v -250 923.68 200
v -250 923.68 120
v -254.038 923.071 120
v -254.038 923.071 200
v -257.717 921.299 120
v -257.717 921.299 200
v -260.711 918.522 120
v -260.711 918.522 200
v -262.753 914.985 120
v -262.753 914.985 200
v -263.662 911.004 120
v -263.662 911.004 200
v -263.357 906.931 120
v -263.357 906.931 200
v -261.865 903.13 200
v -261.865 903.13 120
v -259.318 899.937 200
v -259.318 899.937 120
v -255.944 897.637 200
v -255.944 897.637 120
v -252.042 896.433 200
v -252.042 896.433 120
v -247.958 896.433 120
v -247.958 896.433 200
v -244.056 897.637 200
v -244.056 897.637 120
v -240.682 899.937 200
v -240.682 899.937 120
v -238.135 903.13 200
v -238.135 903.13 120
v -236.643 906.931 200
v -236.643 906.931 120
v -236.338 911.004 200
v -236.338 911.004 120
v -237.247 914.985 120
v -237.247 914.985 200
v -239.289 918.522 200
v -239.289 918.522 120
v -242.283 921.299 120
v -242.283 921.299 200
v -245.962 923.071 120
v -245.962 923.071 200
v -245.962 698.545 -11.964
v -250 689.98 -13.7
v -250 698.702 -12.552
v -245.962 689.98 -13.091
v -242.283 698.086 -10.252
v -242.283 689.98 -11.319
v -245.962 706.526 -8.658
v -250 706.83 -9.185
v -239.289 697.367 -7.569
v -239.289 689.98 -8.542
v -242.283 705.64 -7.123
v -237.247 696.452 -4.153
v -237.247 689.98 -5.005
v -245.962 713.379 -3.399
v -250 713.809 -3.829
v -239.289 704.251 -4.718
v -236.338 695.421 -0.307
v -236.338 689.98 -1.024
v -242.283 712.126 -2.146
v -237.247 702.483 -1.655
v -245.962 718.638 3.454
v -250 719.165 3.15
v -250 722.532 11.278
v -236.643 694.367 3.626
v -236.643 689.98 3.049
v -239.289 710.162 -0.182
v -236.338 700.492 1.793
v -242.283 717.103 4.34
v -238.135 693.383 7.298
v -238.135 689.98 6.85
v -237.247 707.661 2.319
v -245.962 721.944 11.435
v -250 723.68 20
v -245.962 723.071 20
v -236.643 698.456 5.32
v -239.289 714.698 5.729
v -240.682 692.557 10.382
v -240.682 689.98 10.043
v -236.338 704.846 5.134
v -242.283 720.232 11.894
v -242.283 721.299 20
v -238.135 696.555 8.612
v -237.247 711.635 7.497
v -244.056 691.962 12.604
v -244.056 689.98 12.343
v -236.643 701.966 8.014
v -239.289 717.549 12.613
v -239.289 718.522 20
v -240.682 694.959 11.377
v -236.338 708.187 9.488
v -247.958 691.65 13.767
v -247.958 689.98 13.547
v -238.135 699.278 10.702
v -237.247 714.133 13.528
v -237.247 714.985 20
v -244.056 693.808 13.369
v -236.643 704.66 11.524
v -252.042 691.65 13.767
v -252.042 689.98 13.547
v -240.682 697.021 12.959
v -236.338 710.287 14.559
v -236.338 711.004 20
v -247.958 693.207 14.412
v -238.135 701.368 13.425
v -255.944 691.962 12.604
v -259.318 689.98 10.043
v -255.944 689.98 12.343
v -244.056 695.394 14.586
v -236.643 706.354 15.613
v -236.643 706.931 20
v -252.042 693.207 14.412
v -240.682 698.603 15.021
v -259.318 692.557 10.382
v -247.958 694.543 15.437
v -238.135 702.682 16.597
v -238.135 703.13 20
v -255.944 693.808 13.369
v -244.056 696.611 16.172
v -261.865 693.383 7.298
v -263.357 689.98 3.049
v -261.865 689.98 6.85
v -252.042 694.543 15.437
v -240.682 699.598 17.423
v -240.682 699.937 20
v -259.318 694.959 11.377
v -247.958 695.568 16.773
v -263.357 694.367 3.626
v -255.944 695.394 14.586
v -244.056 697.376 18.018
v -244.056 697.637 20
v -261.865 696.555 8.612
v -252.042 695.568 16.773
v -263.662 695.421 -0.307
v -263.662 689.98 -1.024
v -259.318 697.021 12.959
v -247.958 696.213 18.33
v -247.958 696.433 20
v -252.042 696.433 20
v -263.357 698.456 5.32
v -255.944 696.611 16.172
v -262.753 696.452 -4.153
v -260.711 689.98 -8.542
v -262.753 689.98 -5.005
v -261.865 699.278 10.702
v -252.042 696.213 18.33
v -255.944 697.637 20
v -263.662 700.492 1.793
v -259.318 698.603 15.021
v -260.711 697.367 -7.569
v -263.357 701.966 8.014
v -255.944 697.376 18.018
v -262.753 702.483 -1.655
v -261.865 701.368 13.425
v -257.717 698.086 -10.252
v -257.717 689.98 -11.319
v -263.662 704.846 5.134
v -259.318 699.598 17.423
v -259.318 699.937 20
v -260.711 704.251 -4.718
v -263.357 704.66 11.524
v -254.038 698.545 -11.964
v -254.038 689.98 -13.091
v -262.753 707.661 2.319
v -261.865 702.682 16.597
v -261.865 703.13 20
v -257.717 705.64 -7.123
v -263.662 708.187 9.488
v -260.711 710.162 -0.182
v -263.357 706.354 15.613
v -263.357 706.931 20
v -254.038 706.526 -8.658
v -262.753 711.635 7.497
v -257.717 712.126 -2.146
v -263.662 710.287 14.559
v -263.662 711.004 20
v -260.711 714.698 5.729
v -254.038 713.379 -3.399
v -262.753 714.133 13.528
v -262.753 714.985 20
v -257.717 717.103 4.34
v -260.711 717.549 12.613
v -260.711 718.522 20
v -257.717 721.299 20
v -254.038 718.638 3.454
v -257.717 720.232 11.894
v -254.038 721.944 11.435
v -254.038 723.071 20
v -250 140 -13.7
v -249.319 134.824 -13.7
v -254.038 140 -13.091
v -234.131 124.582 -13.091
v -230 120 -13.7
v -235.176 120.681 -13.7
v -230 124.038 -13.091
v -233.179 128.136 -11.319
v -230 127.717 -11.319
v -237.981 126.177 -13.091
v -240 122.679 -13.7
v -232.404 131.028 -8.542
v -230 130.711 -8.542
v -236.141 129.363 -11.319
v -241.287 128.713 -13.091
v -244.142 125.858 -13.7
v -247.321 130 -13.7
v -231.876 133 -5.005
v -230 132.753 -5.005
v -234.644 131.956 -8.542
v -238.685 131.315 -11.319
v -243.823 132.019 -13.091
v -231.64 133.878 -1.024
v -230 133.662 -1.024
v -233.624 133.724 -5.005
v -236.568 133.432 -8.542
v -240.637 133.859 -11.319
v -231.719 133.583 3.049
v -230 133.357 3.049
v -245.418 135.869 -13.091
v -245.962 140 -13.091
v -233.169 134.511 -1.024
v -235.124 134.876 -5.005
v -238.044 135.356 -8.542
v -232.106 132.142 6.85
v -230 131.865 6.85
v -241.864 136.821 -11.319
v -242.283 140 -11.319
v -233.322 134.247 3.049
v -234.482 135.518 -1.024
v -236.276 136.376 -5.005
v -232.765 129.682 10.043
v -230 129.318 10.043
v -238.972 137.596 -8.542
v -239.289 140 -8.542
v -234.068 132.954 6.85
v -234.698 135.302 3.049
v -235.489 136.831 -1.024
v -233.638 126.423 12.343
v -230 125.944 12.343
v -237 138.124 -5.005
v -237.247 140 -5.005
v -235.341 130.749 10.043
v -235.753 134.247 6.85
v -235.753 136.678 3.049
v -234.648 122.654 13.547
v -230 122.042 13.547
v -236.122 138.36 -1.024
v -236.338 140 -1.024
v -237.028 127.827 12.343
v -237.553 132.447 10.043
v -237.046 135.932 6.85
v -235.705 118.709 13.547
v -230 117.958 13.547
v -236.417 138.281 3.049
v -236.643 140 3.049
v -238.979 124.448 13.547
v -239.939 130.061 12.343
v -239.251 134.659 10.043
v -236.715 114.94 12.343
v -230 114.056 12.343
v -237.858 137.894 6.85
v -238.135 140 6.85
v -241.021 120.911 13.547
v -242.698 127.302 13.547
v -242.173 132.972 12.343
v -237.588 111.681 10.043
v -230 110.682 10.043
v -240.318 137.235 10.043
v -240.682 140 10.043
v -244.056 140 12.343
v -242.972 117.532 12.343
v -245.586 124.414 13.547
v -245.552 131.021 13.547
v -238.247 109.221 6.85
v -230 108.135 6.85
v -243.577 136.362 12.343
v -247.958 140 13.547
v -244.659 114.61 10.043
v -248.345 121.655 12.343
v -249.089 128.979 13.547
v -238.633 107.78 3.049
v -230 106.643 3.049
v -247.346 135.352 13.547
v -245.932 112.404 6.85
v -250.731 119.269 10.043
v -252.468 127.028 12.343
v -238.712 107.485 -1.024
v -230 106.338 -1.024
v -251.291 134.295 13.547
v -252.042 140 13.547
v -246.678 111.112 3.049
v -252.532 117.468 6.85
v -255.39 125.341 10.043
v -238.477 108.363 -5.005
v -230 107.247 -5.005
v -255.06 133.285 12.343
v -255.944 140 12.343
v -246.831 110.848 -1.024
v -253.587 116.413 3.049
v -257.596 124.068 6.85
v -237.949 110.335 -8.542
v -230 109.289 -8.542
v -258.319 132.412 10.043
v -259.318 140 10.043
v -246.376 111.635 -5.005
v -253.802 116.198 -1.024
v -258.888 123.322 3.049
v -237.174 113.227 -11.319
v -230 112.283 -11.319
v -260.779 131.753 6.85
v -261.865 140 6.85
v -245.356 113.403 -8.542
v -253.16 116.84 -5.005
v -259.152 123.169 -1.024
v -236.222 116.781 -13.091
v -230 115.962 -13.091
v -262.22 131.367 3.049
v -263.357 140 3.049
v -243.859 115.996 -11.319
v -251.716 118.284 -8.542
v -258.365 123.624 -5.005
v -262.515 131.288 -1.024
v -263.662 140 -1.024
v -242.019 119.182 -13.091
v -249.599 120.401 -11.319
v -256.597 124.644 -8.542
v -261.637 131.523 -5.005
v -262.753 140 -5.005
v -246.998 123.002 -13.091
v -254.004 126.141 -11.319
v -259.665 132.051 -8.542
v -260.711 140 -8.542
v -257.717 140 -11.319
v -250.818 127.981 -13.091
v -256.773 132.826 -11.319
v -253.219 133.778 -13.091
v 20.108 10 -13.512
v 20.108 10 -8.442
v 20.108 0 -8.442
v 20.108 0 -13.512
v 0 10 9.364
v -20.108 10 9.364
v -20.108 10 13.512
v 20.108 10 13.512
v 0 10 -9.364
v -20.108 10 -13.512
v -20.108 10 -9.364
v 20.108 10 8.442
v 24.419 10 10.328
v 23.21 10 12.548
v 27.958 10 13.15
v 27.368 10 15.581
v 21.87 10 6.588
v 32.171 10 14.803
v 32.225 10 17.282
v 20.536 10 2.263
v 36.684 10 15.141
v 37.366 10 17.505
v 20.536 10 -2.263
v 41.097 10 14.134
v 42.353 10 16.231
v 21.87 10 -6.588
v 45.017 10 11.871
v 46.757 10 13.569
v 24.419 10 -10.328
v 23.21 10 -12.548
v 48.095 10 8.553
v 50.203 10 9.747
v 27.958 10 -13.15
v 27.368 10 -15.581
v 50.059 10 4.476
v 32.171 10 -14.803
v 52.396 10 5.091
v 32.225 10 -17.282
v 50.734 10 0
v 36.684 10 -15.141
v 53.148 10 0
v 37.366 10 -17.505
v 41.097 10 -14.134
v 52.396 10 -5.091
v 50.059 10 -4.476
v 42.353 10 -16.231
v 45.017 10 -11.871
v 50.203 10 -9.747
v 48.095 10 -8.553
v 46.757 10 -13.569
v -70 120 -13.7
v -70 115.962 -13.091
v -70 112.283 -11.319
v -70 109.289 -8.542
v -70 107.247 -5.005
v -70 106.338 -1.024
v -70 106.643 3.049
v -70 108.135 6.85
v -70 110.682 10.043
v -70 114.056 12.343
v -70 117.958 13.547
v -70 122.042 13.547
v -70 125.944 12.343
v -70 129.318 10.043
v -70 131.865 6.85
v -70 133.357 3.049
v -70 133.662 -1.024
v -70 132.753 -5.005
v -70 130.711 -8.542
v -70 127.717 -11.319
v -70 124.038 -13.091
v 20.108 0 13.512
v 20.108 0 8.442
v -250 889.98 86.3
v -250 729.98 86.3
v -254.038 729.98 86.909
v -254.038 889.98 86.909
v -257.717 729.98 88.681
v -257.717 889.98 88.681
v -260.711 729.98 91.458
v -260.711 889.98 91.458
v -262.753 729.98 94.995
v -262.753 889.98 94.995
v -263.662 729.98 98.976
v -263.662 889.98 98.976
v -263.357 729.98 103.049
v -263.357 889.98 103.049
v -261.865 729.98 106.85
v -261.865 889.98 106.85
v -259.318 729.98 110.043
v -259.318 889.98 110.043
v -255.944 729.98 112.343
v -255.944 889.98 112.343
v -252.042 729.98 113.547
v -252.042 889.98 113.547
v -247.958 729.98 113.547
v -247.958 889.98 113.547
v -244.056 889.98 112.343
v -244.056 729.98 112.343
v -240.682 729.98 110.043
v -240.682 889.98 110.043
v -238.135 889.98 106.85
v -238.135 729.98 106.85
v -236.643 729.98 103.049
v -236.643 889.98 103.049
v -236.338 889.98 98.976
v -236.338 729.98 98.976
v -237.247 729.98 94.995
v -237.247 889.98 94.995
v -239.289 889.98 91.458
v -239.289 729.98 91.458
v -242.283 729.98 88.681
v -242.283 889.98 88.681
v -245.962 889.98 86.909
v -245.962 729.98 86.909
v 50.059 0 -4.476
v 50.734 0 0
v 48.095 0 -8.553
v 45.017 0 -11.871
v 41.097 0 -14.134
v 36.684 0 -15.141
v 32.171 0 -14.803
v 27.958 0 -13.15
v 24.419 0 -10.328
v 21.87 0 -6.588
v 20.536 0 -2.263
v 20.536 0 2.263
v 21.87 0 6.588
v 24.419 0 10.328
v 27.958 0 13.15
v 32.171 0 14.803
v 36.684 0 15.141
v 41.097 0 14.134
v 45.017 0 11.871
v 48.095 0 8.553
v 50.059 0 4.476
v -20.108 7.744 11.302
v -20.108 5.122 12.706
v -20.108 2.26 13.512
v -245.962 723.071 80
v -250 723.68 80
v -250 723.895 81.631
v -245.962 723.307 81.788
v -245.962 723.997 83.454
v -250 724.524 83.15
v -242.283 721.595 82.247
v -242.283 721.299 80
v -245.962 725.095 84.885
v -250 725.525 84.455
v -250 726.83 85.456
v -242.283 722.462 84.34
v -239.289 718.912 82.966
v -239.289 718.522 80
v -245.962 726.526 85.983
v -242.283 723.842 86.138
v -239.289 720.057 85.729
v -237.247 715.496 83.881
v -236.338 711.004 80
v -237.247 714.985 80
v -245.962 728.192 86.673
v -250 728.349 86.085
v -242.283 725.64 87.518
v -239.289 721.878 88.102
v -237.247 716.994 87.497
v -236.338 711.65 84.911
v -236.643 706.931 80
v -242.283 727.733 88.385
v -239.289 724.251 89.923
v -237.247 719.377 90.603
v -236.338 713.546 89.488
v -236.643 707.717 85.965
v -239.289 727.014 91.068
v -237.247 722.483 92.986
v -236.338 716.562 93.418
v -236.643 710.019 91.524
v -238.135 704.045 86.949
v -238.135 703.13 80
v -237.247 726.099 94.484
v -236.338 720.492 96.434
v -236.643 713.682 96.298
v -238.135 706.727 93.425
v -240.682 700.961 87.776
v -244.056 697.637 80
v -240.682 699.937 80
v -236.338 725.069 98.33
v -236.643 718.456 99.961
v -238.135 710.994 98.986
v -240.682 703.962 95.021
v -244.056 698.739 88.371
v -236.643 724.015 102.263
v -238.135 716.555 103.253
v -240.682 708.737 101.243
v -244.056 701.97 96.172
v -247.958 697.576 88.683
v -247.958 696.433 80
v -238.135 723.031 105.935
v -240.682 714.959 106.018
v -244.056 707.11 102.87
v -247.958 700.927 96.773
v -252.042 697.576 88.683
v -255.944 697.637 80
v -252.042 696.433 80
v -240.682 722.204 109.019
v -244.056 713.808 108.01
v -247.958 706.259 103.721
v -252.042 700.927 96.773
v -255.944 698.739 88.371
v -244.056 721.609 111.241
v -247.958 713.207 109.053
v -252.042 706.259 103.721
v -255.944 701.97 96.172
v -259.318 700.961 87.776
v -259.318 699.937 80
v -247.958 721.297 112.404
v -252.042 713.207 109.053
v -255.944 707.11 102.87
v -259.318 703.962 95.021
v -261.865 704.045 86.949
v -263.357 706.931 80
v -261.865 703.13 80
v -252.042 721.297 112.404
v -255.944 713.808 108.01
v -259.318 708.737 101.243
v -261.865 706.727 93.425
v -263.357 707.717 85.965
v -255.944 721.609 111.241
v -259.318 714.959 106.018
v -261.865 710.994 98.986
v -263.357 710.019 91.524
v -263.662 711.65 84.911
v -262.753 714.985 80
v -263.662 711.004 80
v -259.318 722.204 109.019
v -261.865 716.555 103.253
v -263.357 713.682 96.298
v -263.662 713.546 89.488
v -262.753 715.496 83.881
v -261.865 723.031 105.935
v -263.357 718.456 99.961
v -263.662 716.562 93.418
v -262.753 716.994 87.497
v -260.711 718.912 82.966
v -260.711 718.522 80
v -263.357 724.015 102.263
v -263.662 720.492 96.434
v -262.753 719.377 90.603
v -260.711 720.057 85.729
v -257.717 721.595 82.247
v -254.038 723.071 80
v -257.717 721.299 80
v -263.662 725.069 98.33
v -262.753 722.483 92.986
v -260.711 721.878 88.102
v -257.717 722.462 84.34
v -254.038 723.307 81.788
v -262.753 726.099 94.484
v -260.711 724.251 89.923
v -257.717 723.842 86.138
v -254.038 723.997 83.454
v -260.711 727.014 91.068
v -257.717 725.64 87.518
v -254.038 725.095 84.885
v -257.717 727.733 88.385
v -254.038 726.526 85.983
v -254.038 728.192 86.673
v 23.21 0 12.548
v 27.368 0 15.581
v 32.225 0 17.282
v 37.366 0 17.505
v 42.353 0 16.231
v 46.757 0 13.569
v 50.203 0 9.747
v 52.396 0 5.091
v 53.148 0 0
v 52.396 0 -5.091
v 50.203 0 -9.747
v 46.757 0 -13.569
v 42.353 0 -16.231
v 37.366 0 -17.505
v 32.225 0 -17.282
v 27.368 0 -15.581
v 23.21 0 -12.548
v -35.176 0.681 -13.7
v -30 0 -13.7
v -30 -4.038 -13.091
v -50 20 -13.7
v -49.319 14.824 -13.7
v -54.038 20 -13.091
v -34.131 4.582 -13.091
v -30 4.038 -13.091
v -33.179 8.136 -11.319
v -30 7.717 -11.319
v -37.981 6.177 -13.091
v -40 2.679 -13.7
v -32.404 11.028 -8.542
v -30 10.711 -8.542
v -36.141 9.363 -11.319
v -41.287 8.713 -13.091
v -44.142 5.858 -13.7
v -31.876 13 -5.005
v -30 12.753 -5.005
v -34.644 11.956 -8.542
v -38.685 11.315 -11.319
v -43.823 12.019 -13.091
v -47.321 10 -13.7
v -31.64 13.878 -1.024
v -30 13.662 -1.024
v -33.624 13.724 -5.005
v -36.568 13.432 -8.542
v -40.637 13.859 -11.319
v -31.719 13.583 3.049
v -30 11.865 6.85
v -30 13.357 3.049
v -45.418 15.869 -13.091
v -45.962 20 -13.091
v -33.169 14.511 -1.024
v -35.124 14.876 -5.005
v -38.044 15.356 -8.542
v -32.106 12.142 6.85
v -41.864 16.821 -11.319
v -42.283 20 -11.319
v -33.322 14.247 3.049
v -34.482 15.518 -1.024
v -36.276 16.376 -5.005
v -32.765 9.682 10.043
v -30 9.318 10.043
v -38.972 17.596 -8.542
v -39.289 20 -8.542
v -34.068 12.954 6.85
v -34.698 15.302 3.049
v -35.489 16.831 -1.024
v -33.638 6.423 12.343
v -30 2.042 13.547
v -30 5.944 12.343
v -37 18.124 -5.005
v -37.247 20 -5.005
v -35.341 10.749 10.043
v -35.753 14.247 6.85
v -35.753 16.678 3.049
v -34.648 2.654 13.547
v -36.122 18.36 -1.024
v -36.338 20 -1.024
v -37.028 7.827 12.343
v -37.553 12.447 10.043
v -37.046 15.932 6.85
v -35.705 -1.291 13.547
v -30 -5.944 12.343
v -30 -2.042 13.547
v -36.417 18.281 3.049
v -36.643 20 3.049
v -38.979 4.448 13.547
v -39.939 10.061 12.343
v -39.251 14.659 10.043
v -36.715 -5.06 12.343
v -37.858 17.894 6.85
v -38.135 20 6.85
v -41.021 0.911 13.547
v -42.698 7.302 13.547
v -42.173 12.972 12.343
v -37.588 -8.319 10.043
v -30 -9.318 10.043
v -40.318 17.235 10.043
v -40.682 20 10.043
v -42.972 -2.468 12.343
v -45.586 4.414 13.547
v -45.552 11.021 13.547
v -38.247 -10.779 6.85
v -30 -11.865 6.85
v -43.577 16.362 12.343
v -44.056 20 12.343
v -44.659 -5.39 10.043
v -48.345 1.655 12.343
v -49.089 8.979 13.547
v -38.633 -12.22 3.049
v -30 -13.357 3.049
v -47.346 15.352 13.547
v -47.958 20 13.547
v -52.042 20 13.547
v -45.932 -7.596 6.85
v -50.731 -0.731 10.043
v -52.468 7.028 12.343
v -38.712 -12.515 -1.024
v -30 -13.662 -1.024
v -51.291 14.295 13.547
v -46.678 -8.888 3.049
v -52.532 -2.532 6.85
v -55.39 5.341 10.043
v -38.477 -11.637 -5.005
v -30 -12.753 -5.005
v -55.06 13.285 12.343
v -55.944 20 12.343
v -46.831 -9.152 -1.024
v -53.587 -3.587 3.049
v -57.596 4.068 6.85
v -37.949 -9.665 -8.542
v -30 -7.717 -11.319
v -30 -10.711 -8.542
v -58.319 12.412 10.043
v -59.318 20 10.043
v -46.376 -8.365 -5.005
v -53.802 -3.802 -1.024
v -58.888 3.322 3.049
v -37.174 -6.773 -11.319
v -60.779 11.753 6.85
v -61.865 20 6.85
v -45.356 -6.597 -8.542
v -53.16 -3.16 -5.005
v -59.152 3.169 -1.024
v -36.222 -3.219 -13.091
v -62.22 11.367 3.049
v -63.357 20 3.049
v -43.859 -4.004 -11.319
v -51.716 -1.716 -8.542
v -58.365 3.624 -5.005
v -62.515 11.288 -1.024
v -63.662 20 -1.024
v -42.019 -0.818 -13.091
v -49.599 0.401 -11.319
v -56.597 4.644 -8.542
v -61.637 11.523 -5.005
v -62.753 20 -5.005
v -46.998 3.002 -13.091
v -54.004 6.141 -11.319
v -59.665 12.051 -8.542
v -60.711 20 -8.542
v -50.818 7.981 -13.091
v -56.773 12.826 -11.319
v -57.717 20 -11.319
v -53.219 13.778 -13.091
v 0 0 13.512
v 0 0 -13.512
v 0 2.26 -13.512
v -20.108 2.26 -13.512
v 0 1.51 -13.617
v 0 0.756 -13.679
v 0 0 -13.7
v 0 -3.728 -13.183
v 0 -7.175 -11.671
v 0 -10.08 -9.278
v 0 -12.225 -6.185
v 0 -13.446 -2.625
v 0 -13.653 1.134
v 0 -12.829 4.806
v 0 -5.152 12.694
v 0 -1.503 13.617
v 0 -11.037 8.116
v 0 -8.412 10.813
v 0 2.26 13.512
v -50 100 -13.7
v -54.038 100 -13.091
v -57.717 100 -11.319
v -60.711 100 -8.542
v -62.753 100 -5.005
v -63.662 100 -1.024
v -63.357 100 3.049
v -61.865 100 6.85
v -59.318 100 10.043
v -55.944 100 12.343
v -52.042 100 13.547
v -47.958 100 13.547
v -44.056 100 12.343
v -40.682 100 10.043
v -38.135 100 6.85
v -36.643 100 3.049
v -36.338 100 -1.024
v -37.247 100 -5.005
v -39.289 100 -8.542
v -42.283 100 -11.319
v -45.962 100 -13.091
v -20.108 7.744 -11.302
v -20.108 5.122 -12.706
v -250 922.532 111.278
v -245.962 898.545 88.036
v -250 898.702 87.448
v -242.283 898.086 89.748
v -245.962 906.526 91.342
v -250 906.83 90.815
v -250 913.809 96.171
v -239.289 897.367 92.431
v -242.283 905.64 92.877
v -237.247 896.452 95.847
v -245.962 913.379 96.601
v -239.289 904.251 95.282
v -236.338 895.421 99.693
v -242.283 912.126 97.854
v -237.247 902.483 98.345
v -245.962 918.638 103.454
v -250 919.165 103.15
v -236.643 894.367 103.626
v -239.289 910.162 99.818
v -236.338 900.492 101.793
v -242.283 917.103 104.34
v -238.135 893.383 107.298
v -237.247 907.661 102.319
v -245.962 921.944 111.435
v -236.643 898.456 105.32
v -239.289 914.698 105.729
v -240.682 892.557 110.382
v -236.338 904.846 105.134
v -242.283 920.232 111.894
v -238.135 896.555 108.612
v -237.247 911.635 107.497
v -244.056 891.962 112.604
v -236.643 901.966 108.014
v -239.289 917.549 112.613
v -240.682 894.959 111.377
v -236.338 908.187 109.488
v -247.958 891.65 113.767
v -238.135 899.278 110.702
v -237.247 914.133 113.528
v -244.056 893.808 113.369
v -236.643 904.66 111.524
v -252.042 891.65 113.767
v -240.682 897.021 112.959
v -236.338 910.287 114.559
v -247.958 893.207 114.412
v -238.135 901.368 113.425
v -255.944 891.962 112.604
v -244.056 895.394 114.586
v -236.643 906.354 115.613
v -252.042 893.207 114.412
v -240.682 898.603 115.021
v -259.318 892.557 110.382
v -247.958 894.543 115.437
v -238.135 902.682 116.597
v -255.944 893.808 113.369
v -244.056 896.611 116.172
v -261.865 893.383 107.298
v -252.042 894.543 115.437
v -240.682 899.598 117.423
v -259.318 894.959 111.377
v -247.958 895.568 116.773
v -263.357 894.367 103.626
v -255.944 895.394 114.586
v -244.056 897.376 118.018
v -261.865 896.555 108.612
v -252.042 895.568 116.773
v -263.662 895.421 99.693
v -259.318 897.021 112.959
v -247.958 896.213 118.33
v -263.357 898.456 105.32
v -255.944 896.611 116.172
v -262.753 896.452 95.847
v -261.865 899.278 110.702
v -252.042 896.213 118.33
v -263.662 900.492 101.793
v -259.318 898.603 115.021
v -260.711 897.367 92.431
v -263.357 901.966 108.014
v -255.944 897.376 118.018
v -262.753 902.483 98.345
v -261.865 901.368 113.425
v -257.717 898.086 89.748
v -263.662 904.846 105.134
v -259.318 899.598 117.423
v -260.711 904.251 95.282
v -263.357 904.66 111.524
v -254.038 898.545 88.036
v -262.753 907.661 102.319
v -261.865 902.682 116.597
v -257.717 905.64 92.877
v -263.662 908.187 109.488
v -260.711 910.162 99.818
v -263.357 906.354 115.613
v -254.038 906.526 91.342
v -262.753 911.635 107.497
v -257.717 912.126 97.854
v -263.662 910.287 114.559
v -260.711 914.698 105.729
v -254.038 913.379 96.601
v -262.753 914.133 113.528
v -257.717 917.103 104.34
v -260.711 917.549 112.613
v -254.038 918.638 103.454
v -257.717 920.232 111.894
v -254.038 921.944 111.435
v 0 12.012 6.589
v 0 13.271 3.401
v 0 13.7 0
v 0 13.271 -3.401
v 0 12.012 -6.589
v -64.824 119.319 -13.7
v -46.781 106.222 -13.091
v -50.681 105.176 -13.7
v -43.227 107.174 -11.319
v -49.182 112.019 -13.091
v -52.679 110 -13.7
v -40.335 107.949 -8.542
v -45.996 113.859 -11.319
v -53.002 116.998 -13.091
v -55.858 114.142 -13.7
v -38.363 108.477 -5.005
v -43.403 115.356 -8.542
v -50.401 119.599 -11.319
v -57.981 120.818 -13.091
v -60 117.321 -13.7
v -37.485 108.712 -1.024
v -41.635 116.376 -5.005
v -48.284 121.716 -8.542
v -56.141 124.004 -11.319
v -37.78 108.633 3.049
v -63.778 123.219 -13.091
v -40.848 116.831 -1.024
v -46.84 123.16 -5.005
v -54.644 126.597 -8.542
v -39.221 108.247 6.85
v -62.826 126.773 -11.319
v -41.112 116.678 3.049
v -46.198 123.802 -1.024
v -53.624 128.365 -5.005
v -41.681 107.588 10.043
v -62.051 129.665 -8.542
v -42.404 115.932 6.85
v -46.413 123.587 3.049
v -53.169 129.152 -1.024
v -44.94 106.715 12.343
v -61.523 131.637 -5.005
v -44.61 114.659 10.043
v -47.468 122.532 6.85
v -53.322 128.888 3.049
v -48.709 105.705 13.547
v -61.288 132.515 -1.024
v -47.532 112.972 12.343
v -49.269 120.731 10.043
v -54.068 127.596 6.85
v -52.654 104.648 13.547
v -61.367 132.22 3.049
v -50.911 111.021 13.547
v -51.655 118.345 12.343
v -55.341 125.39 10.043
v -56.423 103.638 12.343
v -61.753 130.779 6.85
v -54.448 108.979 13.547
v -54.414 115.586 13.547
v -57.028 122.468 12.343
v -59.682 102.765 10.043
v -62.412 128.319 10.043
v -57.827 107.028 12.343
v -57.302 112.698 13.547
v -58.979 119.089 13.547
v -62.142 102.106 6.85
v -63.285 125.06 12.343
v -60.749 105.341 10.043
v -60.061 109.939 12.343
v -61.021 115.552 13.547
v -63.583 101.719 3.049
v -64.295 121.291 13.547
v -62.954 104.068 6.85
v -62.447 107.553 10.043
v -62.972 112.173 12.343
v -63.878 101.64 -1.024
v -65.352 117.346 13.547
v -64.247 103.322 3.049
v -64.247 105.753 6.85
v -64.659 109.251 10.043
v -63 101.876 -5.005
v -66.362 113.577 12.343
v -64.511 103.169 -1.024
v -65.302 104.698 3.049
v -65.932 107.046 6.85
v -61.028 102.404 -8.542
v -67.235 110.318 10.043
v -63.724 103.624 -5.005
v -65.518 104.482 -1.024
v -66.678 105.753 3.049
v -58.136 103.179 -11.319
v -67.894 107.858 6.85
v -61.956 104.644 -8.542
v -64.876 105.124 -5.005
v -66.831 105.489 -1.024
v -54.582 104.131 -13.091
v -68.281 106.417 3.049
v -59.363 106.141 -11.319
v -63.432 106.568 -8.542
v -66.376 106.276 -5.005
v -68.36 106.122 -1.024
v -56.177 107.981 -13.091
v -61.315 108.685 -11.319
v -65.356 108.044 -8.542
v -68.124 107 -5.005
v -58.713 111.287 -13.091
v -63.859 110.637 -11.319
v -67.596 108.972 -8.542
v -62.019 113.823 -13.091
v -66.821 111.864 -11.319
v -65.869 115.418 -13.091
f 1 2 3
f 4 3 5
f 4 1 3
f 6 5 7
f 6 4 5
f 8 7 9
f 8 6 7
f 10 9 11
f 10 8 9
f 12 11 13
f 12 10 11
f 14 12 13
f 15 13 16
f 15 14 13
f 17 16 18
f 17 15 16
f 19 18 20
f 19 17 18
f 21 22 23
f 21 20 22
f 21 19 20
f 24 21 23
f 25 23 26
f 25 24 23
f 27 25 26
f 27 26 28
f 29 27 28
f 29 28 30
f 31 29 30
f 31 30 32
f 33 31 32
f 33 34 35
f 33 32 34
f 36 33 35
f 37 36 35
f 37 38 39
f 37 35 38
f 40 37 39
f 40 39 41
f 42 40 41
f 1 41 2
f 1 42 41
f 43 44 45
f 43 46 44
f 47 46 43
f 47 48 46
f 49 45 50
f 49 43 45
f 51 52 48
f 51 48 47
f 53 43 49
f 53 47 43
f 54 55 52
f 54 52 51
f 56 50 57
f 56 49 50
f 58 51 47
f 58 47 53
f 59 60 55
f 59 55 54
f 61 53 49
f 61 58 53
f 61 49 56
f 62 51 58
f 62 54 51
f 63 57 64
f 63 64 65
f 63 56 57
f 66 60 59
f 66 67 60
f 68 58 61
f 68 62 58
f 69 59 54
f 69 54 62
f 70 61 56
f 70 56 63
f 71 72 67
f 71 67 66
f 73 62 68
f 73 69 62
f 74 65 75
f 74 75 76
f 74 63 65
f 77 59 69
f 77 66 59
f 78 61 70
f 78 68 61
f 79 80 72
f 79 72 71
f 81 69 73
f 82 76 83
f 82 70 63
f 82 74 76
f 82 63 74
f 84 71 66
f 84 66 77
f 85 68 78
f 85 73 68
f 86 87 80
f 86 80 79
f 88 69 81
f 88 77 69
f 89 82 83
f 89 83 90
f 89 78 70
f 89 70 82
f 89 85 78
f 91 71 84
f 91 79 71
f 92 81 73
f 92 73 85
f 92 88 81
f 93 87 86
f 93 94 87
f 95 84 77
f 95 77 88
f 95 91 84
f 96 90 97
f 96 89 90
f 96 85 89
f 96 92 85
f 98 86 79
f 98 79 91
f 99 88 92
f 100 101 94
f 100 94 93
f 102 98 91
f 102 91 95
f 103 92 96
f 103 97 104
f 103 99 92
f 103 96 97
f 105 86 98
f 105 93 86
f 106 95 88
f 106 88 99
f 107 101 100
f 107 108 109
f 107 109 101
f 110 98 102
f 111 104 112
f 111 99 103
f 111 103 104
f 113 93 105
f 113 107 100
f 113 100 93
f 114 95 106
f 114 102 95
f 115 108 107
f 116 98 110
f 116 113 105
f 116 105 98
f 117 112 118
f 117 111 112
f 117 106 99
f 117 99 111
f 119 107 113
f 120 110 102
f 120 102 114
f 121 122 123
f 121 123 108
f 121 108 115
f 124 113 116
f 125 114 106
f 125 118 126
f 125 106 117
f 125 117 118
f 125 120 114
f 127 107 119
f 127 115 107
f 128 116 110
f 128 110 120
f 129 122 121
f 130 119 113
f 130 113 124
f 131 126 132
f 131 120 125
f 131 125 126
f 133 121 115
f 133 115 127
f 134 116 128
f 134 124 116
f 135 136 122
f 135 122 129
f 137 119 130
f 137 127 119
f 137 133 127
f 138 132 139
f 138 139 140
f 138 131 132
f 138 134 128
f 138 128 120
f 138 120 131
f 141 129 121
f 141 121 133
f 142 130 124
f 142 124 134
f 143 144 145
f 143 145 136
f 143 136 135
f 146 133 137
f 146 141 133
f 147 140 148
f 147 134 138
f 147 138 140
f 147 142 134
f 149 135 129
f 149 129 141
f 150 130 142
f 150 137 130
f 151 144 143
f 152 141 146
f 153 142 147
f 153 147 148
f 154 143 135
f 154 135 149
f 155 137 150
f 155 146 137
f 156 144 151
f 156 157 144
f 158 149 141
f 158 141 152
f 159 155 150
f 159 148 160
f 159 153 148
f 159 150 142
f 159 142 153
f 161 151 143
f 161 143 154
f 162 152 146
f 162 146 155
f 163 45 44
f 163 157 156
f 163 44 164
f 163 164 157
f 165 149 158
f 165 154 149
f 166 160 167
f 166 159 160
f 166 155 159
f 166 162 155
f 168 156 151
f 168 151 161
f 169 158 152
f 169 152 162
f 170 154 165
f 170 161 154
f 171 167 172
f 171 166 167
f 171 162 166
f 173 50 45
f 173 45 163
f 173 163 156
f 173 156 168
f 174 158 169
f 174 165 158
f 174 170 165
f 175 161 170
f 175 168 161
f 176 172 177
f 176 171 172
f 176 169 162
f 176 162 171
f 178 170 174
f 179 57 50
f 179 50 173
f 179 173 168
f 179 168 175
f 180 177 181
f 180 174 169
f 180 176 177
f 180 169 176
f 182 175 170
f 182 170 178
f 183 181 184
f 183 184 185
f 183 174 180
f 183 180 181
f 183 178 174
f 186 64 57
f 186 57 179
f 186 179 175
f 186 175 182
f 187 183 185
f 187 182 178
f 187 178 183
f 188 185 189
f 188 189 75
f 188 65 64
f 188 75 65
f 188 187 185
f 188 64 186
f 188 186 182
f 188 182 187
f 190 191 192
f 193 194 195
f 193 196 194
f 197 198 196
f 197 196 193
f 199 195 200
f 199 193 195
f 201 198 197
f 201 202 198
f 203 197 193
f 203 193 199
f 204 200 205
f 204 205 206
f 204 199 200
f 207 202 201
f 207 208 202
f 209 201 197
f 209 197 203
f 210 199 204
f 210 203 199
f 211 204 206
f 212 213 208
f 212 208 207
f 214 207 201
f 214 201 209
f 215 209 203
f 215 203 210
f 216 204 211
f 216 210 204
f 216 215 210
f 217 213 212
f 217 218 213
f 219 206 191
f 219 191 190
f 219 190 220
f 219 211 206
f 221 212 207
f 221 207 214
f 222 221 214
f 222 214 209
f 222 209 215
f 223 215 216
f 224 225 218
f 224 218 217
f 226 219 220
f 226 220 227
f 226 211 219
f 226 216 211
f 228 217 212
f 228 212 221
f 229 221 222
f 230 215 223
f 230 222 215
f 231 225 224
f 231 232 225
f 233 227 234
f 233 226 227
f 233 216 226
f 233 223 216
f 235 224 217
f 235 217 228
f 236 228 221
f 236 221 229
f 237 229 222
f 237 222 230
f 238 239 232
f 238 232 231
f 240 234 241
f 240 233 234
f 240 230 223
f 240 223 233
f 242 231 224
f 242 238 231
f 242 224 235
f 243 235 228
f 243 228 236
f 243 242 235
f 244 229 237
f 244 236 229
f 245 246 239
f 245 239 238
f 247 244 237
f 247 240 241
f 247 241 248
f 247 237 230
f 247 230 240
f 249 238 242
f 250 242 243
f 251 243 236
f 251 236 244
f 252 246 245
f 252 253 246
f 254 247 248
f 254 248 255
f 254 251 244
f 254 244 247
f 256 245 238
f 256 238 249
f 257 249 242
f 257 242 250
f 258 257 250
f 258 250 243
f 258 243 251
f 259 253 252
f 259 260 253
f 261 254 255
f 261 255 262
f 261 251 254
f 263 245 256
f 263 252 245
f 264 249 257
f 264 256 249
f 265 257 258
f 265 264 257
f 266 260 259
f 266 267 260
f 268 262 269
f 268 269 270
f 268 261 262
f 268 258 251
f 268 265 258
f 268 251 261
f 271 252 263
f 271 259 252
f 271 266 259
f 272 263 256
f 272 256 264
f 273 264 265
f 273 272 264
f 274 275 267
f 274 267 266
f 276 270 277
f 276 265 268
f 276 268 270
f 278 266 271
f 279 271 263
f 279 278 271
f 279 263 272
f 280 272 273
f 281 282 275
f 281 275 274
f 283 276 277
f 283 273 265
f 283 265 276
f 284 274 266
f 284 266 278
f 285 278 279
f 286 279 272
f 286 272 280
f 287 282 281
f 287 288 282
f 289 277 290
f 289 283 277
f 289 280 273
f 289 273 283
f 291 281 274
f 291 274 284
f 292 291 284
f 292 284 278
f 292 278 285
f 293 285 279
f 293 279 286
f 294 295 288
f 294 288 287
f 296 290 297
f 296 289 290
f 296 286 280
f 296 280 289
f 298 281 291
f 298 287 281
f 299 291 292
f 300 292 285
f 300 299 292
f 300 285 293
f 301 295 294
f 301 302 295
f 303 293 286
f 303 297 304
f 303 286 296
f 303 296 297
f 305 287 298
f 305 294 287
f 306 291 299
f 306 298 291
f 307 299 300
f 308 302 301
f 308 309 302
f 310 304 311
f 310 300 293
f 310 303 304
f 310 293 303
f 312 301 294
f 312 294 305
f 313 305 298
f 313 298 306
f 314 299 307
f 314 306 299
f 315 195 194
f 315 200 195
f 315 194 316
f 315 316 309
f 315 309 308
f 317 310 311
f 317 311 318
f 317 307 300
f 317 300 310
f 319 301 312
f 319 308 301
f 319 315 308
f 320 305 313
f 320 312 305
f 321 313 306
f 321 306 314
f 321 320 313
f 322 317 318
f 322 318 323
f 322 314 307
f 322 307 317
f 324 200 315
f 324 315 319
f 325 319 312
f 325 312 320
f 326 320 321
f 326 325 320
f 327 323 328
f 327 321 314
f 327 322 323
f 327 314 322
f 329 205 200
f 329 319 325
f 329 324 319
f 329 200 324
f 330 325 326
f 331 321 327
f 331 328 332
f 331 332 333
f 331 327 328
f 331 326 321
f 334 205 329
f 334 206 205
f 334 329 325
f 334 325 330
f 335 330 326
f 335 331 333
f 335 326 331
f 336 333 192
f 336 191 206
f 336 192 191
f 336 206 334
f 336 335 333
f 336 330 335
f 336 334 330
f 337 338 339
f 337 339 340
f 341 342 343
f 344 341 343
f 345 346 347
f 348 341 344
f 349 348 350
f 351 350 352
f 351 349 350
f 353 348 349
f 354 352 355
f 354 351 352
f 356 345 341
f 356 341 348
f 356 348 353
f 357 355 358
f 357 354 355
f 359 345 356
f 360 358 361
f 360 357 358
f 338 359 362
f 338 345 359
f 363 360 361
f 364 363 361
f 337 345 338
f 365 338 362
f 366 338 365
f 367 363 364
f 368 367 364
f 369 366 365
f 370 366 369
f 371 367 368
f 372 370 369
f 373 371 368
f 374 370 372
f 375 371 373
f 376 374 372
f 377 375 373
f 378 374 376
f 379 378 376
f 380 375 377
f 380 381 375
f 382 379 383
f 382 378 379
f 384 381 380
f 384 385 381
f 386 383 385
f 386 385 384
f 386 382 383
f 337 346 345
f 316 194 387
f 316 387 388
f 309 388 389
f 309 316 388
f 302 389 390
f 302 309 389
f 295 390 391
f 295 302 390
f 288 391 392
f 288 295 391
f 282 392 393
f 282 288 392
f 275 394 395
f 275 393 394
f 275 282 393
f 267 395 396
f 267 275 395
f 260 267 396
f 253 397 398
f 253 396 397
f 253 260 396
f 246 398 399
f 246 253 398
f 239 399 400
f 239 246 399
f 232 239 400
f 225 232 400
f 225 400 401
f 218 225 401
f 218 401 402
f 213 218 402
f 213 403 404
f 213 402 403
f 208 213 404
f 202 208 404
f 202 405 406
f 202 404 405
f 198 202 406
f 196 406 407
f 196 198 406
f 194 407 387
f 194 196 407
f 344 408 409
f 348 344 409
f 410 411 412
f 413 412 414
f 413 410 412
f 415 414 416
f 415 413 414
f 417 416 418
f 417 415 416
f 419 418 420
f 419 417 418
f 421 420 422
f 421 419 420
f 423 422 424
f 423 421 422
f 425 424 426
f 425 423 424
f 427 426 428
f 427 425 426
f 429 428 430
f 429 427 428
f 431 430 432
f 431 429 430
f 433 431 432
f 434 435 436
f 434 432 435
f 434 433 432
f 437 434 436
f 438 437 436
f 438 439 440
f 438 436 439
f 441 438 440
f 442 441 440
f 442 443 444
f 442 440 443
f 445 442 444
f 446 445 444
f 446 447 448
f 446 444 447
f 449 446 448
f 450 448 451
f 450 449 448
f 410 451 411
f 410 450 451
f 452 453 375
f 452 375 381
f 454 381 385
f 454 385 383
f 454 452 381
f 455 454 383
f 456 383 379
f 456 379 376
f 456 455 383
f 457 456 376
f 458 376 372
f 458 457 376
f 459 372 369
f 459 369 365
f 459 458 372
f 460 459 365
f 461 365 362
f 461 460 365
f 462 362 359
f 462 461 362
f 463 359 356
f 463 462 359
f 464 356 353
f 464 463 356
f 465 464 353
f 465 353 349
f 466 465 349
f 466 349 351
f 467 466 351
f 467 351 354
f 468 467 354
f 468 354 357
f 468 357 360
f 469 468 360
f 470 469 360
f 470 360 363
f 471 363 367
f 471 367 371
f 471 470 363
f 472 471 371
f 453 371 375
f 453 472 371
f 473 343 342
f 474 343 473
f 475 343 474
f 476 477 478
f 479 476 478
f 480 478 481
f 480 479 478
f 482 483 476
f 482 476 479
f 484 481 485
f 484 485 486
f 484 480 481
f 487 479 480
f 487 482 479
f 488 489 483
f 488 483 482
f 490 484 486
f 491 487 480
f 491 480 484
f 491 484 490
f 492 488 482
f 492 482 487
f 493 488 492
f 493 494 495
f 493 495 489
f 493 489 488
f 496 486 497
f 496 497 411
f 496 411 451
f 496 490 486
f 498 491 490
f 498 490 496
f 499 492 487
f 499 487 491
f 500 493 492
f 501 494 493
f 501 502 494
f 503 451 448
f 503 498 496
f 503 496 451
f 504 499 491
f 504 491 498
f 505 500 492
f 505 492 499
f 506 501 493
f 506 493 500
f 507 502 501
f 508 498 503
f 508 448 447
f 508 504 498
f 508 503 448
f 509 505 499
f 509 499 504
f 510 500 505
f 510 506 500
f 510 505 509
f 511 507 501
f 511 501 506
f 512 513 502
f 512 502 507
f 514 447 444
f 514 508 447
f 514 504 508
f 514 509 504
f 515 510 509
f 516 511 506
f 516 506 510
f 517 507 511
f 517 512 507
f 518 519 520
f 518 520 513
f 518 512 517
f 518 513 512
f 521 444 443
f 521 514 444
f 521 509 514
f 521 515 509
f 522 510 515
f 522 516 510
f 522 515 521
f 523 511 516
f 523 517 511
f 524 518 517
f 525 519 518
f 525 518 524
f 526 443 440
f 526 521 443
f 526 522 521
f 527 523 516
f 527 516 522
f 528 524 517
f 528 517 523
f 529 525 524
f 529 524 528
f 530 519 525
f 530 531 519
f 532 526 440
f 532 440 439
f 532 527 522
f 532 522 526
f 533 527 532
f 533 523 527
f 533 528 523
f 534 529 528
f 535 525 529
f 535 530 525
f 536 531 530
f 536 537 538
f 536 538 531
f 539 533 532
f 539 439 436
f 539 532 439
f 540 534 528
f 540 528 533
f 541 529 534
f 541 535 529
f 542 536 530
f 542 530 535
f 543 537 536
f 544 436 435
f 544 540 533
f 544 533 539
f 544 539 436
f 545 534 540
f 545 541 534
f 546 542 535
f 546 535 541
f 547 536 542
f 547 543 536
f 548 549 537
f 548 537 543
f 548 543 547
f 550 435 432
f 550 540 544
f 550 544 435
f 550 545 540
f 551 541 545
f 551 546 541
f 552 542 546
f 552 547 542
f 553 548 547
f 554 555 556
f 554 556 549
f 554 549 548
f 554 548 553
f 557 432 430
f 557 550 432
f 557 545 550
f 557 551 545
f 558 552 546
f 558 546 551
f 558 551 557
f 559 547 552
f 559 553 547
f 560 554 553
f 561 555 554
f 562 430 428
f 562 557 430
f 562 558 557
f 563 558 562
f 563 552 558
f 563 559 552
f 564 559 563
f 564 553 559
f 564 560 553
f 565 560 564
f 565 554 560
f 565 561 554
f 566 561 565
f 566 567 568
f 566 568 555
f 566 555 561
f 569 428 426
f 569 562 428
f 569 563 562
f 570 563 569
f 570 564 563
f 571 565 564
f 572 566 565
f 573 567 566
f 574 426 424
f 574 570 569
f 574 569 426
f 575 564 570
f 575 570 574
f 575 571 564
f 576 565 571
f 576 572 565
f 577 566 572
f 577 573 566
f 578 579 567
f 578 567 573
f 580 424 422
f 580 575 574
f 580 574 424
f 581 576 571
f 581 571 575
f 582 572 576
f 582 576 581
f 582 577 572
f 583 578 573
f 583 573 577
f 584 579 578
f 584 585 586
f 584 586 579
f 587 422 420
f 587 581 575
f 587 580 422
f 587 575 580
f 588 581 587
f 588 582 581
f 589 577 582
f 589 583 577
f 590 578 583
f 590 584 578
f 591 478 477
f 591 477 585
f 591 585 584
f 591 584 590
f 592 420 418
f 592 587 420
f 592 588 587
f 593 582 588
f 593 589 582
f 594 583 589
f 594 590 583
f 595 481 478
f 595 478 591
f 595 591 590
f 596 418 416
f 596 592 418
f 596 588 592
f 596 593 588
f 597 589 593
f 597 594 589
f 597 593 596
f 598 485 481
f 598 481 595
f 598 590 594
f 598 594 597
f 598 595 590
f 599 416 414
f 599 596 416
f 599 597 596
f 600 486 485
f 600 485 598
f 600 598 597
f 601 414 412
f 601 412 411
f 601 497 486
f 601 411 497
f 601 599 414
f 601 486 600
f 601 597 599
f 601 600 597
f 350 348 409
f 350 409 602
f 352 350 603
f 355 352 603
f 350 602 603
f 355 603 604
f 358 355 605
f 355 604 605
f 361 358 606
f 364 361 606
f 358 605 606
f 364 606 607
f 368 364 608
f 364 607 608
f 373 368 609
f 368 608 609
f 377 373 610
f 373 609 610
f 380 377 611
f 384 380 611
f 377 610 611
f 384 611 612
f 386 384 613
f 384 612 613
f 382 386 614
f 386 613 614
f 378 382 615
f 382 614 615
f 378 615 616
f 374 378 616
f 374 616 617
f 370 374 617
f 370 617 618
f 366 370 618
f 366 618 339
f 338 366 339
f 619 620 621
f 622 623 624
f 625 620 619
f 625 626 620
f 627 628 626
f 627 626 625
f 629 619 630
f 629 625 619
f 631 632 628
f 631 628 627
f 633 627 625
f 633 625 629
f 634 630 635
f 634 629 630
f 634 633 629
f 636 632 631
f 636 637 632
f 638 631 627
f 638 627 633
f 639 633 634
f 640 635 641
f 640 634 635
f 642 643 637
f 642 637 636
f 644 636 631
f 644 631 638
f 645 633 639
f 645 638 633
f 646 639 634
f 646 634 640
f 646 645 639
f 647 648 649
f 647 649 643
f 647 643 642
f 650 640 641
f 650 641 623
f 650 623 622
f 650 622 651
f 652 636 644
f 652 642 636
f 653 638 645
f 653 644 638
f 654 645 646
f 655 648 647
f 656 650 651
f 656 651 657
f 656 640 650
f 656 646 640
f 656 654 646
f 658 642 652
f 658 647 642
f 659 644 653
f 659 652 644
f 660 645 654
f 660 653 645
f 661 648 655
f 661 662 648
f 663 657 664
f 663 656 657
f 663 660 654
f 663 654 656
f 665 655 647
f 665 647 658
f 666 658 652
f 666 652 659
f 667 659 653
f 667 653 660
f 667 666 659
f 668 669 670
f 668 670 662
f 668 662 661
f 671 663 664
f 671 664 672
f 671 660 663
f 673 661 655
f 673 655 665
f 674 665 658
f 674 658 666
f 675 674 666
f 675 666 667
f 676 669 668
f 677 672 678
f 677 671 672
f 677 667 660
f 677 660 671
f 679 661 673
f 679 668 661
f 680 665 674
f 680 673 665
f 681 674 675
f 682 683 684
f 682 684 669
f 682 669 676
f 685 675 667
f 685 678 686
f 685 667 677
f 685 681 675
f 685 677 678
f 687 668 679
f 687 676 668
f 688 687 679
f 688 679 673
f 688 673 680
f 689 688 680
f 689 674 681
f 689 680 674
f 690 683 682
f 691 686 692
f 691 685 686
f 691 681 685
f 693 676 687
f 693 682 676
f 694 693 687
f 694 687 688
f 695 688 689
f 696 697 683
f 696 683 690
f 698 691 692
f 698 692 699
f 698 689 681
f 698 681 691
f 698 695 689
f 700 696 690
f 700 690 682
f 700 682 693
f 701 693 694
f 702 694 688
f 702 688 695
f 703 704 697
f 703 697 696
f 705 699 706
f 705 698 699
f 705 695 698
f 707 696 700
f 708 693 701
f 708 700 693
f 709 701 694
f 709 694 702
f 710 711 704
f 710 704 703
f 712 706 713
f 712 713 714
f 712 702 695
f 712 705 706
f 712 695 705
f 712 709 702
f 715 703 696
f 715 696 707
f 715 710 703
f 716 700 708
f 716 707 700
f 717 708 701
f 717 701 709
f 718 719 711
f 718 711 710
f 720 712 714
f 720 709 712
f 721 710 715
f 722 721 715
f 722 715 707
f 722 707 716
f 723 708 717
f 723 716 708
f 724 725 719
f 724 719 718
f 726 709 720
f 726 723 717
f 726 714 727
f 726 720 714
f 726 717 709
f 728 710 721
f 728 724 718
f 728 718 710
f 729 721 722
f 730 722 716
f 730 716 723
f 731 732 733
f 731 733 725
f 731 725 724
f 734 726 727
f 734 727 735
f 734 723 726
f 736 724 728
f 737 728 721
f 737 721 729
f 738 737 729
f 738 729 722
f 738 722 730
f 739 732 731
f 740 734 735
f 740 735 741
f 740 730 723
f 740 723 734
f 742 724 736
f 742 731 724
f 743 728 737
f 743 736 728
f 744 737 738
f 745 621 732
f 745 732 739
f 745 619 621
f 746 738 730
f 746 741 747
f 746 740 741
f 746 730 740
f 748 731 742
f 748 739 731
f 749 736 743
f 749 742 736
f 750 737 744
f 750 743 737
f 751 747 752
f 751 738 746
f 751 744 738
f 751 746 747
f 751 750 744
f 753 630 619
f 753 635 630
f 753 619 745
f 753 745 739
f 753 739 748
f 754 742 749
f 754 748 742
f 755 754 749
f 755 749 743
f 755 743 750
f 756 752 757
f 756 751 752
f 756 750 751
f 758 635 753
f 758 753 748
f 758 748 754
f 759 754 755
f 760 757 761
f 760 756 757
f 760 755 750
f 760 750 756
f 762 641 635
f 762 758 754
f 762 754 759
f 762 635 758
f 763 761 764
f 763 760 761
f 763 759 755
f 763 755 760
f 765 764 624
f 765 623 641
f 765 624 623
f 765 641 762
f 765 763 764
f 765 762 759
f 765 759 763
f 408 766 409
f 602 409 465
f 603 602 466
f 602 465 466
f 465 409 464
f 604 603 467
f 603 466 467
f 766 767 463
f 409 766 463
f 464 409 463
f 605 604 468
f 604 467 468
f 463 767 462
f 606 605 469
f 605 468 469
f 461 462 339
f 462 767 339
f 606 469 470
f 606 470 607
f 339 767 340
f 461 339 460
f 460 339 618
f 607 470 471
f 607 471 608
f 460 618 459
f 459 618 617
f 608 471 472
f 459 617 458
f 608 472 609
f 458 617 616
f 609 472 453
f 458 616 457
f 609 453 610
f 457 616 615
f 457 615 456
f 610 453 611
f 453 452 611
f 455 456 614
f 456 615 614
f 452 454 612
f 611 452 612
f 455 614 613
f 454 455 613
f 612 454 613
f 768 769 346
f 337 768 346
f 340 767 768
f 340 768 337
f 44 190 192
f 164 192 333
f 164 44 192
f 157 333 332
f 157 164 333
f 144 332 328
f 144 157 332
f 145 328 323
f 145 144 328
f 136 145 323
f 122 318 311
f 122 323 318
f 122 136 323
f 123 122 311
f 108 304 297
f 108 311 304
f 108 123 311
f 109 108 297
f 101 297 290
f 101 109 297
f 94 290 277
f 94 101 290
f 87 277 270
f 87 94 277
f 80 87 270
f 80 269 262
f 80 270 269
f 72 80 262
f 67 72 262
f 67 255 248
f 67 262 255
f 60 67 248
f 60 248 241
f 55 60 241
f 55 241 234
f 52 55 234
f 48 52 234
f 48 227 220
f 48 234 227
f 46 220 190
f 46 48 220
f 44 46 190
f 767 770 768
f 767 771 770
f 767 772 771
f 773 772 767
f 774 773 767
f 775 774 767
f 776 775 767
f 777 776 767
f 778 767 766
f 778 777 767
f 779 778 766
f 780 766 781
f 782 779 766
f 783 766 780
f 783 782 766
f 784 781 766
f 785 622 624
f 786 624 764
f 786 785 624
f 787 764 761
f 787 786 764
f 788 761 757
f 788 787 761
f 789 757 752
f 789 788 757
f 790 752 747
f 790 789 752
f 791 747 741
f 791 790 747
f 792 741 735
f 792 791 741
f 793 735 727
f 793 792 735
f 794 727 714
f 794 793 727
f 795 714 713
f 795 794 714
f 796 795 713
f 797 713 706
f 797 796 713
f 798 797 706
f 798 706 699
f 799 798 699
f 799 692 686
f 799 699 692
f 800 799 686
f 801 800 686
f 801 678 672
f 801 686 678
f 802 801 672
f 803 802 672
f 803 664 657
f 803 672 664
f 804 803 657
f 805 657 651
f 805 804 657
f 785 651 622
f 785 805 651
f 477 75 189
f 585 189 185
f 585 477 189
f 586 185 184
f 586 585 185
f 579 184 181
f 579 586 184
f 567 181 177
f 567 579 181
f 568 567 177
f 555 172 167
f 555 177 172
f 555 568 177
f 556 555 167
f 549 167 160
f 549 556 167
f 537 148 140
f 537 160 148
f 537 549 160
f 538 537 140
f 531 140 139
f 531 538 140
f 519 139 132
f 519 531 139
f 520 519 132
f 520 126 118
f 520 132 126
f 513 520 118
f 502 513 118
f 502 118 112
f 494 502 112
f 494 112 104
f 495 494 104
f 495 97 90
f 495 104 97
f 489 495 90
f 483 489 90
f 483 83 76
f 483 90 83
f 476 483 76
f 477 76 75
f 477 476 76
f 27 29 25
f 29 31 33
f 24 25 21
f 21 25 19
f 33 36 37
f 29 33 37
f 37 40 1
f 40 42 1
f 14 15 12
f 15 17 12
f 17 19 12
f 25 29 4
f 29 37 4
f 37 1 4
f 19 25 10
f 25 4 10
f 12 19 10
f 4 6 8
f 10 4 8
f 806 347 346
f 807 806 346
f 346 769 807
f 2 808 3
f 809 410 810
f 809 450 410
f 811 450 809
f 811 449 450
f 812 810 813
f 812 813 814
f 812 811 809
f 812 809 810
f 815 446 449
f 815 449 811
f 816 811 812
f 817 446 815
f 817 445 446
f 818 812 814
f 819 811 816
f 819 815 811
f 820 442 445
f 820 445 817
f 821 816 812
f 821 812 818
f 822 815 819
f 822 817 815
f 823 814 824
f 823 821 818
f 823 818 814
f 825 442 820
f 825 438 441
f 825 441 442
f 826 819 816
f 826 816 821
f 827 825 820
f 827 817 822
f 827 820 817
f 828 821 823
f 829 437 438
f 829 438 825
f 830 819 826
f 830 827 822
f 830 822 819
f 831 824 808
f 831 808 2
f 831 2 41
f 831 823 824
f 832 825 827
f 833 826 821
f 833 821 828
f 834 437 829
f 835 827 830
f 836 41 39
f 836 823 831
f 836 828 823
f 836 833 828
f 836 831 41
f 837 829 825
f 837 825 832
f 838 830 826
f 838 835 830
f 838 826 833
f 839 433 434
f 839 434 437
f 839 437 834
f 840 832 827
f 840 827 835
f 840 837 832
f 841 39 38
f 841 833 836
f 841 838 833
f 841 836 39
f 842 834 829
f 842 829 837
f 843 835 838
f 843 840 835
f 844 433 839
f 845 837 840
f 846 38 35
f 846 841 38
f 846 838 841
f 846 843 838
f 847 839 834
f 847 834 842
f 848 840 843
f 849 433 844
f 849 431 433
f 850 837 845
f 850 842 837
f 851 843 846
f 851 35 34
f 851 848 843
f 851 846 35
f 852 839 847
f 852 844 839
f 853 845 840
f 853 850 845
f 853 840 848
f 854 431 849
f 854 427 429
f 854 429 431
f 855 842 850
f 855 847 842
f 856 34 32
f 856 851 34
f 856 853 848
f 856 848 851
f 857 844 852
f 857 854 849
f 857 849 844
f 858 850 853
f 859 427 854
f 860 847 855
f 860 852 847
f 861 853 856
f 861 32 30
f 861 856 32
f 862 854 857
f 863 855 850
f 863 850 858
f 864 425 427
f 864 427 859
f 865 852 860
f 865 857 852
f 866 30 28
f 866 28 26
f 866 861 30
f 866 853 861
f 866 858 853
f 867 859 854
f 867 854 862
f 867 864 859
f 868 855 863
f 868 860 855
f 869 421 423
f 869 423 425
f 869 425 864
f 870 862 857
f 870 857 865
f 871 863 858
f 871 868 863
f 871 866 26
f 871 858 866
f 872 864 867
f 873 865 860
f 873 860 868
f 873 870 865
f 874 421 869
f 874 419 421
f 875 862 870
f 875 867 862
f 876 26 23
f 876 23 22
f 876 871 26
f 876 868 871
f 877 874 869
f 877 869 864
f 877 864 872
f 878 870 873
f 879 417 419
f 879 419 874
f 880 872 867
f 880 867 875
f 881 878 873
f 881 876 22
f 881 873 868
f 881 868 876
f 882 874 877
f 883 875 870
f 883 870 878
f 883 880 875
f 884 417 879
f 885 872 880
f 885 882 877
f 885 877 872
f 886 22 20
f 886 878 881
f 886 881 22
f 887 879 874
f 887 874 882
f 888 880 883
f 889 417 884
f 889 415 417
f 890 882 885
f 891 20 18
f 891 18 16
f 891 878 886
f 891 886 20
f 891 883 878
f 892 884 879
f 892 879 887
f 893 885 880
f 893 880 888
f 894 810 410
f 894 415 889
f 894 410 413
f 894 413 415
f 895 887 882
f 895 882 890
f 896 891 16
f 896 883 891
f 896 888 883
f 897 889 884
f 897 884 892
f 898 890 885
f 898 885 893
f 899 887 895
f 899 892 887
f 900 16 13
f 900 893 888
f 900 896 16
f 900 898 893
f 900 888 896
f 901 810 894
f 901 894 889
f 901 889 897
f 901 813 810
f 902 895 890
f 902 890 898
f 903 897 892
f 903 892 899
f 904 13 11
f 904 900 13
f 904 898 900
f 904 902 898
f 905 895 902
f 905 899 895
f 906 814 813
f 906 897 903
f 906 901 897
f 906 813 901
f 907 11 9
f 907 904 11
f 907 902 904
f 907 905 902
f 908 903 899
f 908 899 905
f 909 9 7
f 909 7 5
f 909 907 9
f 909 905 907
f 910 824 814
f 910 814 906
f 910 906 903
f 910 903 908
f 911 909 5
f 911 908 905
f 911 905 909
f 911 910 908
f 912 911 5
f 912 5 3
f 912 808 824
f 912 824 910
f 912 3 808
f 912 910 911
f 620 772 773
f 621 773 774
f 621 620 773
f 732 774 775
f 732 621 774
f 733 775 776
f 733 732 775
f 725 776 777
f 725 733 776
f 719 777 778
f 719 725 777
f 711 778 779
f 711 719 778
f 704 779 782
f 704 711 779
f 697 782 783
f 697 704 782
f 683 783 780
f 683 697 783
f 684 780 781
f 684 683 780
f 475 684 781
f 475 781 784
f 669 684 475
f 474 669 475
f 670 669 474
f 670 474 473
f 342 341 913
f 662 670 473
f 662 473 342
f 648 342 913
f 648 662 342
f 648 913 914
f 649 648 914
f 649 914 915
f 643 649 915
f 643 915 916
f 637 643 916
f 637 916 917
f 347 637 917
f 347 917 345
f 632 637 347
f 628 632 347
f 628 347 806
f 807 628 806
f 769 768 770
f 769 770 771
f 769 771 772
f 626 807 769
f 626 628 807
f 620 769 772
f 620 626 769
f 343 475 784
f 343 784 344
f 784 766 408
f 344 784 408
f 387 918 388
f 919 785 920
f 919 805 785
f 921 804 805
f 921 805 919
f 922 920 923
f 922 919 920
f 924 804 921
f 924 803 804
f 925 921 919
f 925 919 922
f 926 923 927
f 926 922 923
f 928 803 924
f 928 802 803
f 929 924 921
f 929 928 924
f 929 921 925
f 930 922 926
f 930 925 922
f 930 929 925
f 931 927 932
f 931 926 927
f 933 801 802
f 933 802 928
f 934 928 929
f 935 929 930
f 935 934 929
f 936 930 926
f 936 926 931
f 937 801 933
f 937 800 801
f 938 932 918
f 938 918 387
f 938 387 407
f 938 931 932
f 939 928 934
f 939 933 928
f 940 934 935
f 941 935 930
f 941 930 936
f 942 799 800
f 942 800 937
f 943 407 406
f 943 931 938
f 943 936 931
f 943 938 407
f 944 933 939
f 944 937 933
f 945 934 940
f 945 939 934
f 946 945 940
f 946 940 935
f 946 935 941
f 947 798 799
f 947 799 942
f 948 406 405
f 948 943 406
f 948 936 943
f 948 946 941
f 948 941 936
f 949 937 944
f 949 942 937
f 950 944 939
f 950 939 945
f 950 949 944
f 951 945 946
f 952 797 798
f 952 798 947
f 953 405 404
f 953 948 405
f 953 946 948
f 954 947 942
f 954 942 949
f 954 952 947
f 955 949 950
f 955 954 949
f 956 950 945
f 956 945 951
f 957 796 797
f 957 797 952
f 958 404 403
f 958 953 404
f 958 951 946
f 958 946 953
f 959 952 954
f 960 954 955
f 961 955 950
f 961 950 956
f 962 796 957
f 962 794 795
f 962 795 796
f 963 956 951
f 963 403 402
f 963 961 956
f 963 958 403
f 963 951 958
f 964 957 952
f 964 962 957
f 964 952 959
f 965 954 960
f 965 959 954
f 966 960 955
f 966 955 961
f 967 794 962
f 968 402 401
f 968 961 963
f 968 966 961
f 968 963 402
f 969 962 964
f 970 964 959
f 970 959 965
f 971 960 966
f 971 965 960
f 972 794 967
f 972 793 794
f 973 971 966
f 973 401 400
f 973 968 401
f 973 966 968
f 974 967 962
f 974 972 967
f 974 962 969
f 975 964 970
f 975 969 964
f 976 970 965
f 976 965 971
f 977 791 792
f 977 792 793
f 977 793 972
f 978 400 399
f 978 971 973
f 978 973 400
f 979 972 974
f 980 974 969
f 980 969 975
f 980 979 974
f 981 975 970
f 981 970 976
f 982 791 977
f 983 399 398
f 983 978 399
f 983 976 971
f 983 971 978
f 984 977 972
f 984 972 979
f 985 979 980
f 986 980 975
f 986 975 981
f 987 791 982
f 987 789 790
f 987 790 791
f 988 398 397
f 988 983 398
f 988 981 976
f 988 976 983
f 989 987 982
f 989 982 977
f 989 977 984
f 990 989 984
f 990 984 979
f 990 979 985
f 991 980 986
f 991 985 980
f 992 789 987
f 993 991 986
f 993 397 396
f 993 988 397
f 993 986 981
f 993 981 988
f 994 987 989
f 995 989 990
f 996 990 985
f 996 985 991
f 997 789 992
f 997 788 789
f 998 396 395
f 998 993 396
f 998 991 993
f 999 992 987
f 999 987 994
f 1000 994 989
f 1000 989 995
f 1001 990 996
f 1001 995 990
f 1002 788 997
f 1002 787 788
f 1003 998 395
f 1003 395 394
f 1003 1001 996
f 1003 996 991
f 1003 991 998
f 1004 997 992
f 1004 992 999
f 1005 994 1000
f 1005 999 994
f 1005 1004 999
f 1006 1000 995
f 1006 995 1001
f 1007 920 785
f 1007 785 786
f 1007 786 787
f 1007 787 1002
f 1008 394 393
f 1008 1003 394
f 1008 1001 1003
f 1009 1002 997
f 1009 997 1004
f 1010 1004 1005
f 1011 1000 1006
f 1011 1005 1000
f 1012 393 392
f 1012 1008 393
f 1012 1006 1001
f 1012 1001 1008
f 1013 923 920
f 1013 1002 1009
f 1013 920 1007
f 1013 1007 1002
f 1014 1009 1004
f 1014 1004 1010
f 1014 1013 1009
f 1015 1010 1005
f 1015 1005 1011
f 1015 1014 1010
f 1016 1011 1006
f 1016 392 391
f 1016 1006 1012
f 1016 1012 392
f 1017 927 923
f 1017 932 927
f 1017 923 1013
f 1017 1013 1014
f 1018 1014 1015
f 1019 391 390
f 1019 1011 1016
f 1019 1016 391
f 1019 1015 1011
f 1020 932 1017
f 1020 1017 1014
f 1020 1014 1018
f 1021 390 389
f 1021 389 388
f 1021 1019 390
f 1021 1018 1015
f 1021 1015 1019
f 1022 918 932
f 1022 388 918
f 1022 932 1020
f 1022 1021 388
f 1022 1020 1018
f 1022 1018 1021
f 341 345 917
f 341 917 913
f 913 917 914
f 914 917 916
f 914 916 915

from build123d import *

# Parameters (mm, degrees)
CROQUIS1_R              = 13.7
CROQUIS2_R              = 17.598610065
CROQUIS2_R_2            = 15.183788675
SALIENTE_EXTRUIR1_DEPTH = 10
CROQUIS3_W              = 40.216102736
CROQUIS3_H              = 27.024768892
SALIENTE_EXTRUIR2_DEPTH = 10


with BuildPart() as part:
    # Barrer1: sweep along a curve in space
    with BuildLine() as barrer1_path:
        Line((0, 0, 0), (-30, 0, 0))
        ThreePointArc((-30, 0, 0), (-44.142135624, 5.857864376, 0), (-50, 20, 0))
        Line((-50, 20, 0), (-50, 100, 0))
        ThreePointArc((-50, 100, 0), (-55.857864376, 114.142135624, 0), (-70, 120, 0))
        Line((-70, 120, 0), (-230, 120, 0))
        ThreePointArc((-230, 120, 0), (-244.142135624, 125.857864376, 0), (-250, 140, 0))
        Line((-250, 140, 0), (-250, 689.98, 0))
        ThreePointArc((-250, 689.98, 0), (-250, 704.122135624, 5.857864376), (-250, 709.98, 20))
        Line((-250, 709.98, 20), (-250, 709.98, 80))
        ThreePointArc((-250, 709.98, 80), (-250, 715.837864376, 94.142135624), (-250, 729.98, 100))
        Line((-250, 729.98, 100), (-250, 889.98, 100))
        ThreePointArc((-250, 889.98, 100), (-250, 904.122135624, 105.857864376), (-250, 909.98, 120))
        Line((-250, 909.98, 120), (-250, 909.98, 200))
    # Croquis1 → Barrer1 (sweep)
    with BuildSketch(Plane(origin=(0, 0, 0), x_dir=(0, 0, -1), z_dir=(1, 0, 0))):
        Circle(CROQUIS1_R)
    sweep(path=barrer1_path.line)



with BuildPart() as body_2:
    # Croquis2 → Saliente-Extruir1 (new body)
    with BuildSketch(Plane(origin=(0, 0, 0), x_dir=(1, 0, 0), z_dir=(0, 1, 0))):
        with Locations((35.549795944, 0)):
            Circle(CROQUIS2_R)
        with Locations((35.549795944, 0)):
            Circle(CROQUIS2_R_2, mode=Mode.SUBTRACT)
    extrude(amount=SALIENTE_EXTRUIR1_DEPTH)


with BuildPart() as part_1:
    add(part.part)

    add(body_2.part)  # Saliente-Extruir2 merges body 2
    # Croquis3 → Saliente-Extruir2 (add)
    with BuildSketch(Plane(origin=(0, 0, 0), x_dir=(1, 0, 0), z_dir=(0, 1, 0))):
        Rectangle(CROQUIS3_W, CROQUIS3_H)
    extrude(amount=SALIENTE_EXTRUIR2_DEPTH)


solid = part_1.part
